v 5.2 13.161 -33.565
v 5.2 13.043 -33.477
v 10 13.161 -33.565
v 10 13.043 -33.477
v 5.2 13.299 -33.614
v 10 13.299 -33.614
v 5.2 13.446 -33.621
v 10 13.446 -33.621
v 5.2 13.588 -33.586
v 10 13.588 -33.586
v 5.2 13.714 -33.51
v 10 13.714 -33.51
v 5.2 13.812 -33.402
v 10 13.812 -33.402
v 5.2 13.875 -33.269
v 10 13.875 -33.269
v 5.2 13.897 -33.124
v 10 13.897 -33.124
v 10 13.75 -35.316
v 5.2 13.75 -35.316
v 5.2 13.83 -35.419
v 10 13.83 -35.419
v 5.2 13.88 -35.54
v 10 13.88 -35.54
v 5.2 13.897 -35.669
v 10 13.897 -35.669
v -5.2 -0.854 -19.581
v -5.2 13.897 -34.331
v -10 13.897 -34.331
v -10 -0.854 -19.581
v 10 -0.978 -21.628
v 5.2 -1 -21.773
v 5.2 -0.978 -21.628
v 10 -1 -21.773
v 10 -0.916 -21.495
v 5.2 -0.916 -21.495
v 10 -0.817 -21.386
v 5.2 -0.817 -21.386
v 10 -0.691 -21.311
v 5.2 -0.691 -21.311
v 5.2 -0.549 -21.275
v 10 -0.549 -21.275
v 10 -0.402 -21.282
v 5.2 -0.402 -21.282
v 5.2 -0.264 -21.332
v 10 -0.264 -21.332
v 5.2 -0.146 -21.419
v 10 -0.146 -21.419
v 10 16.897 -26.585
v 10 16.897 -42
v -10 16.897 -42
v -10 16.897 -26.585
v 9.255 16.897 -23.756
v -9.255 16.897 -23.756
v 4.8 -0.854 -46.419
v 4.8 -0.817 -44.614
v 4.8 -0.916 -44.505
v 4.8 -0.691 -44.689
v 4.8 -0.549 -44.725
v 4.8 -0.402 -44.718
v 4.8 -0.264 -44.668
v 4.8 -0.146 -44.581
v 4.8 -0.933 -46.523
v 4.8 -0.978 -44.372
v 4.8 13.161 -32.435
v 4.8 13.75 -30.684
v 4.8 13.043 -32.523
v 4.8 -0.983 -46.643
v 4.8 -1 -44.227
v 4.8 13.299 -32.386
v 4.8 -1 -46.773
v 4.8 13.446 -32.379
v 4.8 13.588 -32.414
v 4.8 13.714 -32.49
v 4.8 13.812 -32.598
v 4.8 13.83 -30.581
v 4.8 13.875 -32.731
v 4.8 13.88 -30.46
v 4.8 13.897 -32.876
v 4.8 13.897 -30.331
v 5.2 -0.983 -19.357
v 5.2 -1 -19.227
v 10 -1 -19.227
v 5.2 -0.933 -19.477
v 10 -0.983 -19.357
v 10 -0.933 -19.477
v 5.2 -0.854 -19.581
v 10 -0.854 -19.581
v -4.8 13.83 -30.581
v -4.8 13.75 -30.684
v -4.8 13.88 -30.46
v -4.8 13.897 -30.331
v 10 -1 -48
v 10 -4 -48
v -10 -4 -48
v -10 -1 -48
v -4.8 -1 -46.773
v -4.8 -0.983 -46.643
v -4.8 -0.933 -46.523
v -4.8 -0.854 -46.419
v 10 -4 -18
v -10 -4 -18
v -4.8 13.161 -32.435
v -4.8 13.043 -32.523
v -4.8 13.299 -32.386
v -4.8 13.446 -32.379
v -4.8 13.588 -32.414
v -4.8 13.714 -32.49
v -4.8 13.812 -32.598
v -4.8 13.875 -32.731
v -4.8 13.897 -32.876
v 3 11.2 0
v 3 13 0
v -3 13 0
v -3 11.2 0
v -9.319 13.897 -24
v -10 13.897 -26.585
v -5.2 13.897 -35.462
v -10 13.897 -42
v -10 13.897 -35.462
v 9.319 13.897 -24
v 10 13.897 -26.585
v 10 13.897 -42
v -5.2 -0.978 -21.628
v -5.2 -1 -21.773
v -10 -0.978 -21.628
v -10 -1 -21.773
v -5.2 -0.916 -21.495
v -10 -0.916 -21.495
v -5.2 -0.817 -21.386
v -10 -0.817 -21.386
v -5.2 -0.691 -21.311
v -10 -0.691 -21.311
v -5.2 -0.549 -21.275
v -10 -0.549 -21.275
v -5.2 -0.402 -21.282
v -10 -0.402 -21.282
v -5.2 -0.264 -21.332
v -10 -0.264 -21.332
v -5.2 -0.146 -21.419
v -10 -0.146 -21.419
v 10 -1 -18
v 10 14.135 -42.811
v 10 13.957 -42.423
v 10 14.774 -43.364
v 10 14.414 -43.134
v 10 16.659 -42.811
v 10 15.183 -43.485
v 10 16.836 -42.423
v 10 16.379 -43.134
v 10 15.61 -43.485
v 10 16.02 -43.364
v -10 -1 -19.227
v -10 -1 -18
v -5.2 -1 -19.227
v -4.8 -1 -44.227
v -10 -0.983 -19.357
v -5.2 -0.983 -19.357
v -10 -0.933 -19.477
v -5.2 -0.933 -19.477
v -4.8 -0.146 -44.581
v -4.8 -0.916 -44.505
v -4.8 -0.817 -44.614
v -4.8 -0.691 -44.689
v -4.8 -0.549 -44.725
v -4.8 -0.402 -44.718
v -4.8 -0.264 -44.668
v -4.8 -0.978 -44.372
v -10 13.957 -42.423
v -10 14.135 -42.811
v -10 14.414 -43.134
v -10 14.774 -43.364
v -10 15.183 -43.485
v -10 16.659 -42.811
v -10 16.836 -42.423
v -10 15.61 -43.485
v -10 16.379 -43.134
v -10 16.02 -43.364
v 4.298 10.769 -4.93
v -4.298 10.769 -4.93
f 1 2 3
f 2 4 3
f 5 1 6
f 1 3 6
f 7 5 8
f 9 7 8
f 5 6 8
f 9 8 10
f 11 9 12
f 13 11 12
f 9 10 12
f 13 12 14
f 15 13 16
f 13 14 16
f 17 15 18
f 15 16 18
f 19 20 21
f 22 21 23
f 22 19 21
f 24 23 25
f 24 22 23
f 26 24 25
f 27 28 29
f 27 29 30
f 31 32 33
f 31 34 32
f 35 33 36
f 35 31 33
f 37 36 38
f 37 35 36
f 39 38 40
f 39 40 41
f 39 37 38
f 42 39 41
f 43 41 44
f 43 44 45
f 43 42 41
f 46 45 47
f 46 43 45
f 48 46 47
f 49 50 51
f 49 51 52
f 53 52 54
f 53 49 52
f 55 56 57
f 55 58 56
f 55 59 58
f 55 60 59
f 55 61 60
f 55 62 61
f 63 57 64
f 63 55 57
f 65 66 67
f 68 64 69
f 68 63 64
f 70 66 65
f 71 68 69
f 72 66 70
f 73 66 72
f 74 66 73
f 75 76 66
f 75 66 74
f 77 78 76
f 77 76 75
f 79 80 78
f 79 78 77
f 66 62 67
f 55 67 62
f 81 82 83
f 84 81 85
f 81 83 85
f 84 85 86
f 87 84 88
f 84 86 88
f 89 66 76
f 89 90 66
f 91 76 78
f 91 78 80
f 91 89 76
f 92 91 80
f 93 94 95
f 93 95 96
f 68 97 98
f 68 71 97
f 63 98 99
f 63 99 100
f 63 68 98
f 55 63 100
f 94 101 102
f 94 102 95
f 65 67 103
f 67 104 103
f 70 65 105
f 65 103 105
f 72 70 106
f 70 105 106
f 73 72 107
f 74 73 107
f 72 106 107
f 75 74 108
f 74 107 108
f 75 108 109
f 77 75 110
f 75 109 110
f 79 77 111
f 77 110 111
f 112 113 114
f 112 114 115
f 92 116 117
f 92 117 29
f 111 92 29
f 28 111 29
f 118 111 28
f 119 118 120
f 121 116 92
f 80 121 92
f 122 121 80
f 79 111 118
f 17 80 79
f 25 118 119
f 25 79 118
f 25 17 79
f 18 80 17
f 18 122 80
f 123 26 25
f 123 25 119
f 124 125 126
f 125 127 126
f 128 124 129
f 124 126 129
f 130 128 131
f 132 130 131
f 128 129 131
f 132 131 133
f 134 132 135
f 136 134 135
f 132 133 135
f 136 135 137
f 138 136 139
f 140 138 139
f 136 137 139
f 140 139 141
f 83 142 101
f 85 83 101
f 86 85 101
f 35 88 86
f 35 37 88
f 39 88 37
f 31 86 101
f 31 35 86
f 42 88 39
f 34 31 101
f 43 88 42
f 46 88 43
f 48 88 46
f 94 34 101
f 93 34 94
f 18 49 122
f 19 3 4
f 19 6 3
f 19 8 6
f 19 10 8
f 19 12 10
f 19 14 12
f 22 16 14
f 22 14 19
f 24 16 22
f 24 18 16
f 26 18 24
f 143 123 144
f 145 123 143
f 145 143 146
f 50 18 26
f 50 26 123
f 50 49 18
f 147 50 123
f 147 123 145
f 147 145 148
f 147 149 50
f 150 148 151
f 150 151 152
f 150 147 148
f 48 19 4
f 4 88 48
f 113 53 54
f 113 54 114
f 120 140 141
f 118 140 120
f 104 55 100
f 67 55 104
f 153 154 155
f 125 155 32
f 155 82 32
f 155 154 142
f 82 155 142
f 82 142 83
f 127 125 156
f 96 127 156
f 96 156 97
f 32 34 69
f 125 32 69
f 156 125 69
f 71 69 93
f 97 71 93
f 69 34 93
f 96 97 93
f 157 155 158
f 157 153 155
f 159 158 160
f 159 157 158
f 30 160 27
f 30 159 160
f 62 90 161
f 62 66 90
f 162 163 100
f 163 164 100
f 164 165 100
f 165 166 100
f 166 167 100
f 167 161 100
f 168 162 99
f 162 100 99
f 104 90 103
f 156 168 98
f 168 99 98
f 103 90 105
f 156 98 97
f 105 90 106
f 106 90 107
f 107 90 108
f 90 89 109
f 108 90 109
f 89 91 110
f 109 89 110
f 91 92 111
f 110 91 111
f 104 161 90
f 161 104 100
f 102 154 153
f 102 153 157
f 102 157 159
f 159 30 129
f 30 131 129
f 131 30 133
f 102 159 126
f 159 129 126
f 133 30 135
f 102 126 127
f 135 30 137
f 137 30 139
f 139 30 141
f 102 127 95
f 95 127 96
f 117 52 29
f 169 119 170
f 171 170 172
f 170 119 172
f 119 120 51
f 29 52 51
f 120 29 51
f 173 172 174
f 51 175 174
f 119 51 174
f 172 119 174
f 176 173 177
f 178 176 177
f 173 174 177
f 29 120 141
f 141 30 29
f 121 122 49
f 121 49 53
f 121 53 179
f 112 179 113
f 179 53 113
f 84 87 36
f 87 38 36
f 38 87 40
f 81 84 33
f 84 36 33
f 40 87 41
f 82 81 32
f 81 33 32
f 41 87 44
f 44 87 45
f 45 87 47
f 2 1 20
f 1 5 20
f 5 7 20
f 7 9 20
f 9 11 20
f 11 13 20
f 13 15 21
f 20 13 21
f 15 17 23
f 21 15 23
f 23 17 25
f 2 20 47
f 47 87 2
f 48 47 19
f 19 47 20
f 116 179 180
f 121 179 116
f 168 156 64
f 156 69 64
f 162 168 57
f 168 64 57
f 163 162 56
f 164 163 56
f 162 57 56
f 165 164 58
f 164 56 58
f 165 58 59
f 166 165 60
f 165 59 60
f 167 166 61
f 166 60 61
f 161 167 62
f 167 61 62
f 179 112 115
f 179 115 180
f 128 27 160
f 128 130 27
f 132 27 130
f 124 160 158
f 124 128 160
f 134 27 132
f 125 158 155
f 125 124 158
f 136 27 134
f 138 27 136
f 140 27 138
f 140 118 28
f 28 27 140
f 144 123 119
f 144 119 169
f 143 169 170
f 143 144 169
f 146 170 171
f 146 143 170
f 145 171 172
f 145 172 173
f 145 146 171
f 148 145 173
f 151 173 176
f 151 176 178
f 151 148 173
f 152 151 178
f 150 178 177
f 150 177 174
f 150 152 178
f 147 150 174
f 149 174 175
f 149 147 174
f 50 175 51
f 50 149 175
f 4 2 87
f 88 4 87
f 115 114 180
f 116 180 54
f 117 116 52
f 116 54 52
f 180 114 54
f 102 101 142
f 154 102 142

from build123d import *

# Parameters (mm, degrees)
BOSS_EXTRUDE1_DEPTH   = 10
SKETCH1_W             = 30
SKETCH1_H             = 3
BOSS_EXTRUDE1_2_DEPTH = 10
BOSS_EXTRUDE2_DEPTH   = 4.8
BOSS_EXTRUDE3_START   = 5.2
BOSS_EXTRUDE3_DEPTH   = 4.8
FILLET1_R             = 0.5
CUT_EXTRUDE1_REACH    = 55.298


with BuildPart() as part:
    # Sketch1 → Boss-Extrude1 (new, symmetric)
    with BuildSketch(Plane(origin=(0, 0, 0), x_dir=(0, 0, -1), z_dir=(1, 0, 0))):
        with BuildLine():
            Line((0, 13), (0, 11.2))
            Line((0, 11.2), (4.930378913, 10.768647738))
            Line((4.930378913, 10.768647738), (24, 13.896674439))
            Line((24, 13.896674439), (42, 13.896674439))
            ThreePointArc((42, 13.896674439), (43.5, 15.396674439), (42, 16.896674439))
            Line((42, 16.896674439), (23.755585281, 16.896674439))
            Line((23.755585281, 16.896674439), (0, 13))
        make_face()
    extrude(amount=BOSS_EXTRUDE1_DEPTH, both=True)



with BuildPart() as body_2:
    # Sketch1 → Boss-Extrude1 2 (new, symmetric)
    with BuildSketch(Plane(origin=(0, 0, 0), x_dir=(0, 0, -1), z_dir=(1, 0, 0))):
        with Locations((33, -2.5)):
            Rectangle(SKETCH1_W, SKETCH1_H)
    extrude(amount=BOSS_EXTRUDE1_2_DEPTH, both=True)


with BuildPart() as part_1:
    add(part.part)

    add(body_2.part)  # Boss-Extrude2 merges body 2
    # Sketch2 → Boss-Extrude2 (add, symmetric)
    with BuildSketch(Plane(origin=(0, 0, 0), x_dir=(0, 0, -1), z_dir=(1, 0, 0))):
        Polygon((30.537640136, 13.896674439), (45.434314575, -1), (46.565685425, -1), (31.669010986, 13.896674439), align=None)
    extrude(amount=BOSS_EXTRUDE2_DEPTH, both=True)

    # Sketch3 → Boss-Extrude3 (add)
    with BuildSketch(Plane(origin=(0, 0, 0), x_dir=(0, 0, -1), z_dir=(1, 0, 0)).offset(BOSS_EXTRUDE3_START)):
        Polygon((19.434314575, -1), (20.565685425, -1), (35.462359864, 13.896674439), (34.330989014, 13.896674439), align=None)
    boss_extrude3 = extrude(amount=BOSS_EXTRUDE3_DEPTH)

    # Mirror1: Boss-Extrude3 across plane
    add(boss_extrude3.mirror(Plane(origin=(0, 0, 0), x_dir=(0, 0, 1), z_dir=(1, 0, 0))))

    # Fillet1
    fillet1_edges = [part_1.edges().sort_by_distance(p)[0] for p in [
        (0, 13.896674439, -31.669010986),
        (0, 13.896674439, -30.537640136),
        (0, -1, -45.434314575),
        (0, -1, -46.565685425),
        (7.6, -1, -20.565685425),
        (7.6, 13.896674439, -35.462359864),
        (7.6, 13.896674439, -34.330989014),
        (7.6, -1, -19.434314575),
        (-7.6, -1, -20.565685425),
        (-7.6, -1, -19.434314575),
    ]]
    fillet(fillet1_edges, radius=FILLET1_R)

    # Sketch4 → Cut-Extrude1 (cut, up to next)
    with BuildSketch(Plane(origin=(0, 16.896674439, 0), x_dir=(1, 0, 0), z_dir=(0, 1, 0)), mode=Mode.PRIVATE) as cut_extrude1_sk1:
        Polygon((-3, 0), (-10, 26.585294569), (-10, 0), align=None)
    cut_extrude1_tool1 = extrude(cut_extrude1_sk1.sketch, amount=-CUT_EXTRUDE1_REACH, mode=Mode.PRIVATE) & part_1.part
    # Sketch4 → Cut-Extrude1 (cut, up to next)
    with BuildSketch(Plane(origin=(0, 16.896674439, 0), x_dir=(1, 0, 0), z_dir=(0, 1, 0)), mode=Mode.PRIVATE) as cut_extrude1_sk2:
        Polygon((3, 0), (10, 0), (10, 26.585294569), align=None)
    cut_extrude1_tool2 = extrude(cut_extrude1_sk2.sketch, amount=-CUT_EXTRUDE1_REACH, mode=Mode.PRIVATE) & part_1.part
    add(cut_extrude1_tool1.solids().sort_by_distance((-7.666667, 16.896674, -8.861765))[0], mode=Mode.SUBTRACT)
    add(cut_extrude1_tool2.solids().sort_by_distance((7.666667, 16.896674, -8.861765))[0], mode=Mode.SUBTRACT)


solid = part_1.part
